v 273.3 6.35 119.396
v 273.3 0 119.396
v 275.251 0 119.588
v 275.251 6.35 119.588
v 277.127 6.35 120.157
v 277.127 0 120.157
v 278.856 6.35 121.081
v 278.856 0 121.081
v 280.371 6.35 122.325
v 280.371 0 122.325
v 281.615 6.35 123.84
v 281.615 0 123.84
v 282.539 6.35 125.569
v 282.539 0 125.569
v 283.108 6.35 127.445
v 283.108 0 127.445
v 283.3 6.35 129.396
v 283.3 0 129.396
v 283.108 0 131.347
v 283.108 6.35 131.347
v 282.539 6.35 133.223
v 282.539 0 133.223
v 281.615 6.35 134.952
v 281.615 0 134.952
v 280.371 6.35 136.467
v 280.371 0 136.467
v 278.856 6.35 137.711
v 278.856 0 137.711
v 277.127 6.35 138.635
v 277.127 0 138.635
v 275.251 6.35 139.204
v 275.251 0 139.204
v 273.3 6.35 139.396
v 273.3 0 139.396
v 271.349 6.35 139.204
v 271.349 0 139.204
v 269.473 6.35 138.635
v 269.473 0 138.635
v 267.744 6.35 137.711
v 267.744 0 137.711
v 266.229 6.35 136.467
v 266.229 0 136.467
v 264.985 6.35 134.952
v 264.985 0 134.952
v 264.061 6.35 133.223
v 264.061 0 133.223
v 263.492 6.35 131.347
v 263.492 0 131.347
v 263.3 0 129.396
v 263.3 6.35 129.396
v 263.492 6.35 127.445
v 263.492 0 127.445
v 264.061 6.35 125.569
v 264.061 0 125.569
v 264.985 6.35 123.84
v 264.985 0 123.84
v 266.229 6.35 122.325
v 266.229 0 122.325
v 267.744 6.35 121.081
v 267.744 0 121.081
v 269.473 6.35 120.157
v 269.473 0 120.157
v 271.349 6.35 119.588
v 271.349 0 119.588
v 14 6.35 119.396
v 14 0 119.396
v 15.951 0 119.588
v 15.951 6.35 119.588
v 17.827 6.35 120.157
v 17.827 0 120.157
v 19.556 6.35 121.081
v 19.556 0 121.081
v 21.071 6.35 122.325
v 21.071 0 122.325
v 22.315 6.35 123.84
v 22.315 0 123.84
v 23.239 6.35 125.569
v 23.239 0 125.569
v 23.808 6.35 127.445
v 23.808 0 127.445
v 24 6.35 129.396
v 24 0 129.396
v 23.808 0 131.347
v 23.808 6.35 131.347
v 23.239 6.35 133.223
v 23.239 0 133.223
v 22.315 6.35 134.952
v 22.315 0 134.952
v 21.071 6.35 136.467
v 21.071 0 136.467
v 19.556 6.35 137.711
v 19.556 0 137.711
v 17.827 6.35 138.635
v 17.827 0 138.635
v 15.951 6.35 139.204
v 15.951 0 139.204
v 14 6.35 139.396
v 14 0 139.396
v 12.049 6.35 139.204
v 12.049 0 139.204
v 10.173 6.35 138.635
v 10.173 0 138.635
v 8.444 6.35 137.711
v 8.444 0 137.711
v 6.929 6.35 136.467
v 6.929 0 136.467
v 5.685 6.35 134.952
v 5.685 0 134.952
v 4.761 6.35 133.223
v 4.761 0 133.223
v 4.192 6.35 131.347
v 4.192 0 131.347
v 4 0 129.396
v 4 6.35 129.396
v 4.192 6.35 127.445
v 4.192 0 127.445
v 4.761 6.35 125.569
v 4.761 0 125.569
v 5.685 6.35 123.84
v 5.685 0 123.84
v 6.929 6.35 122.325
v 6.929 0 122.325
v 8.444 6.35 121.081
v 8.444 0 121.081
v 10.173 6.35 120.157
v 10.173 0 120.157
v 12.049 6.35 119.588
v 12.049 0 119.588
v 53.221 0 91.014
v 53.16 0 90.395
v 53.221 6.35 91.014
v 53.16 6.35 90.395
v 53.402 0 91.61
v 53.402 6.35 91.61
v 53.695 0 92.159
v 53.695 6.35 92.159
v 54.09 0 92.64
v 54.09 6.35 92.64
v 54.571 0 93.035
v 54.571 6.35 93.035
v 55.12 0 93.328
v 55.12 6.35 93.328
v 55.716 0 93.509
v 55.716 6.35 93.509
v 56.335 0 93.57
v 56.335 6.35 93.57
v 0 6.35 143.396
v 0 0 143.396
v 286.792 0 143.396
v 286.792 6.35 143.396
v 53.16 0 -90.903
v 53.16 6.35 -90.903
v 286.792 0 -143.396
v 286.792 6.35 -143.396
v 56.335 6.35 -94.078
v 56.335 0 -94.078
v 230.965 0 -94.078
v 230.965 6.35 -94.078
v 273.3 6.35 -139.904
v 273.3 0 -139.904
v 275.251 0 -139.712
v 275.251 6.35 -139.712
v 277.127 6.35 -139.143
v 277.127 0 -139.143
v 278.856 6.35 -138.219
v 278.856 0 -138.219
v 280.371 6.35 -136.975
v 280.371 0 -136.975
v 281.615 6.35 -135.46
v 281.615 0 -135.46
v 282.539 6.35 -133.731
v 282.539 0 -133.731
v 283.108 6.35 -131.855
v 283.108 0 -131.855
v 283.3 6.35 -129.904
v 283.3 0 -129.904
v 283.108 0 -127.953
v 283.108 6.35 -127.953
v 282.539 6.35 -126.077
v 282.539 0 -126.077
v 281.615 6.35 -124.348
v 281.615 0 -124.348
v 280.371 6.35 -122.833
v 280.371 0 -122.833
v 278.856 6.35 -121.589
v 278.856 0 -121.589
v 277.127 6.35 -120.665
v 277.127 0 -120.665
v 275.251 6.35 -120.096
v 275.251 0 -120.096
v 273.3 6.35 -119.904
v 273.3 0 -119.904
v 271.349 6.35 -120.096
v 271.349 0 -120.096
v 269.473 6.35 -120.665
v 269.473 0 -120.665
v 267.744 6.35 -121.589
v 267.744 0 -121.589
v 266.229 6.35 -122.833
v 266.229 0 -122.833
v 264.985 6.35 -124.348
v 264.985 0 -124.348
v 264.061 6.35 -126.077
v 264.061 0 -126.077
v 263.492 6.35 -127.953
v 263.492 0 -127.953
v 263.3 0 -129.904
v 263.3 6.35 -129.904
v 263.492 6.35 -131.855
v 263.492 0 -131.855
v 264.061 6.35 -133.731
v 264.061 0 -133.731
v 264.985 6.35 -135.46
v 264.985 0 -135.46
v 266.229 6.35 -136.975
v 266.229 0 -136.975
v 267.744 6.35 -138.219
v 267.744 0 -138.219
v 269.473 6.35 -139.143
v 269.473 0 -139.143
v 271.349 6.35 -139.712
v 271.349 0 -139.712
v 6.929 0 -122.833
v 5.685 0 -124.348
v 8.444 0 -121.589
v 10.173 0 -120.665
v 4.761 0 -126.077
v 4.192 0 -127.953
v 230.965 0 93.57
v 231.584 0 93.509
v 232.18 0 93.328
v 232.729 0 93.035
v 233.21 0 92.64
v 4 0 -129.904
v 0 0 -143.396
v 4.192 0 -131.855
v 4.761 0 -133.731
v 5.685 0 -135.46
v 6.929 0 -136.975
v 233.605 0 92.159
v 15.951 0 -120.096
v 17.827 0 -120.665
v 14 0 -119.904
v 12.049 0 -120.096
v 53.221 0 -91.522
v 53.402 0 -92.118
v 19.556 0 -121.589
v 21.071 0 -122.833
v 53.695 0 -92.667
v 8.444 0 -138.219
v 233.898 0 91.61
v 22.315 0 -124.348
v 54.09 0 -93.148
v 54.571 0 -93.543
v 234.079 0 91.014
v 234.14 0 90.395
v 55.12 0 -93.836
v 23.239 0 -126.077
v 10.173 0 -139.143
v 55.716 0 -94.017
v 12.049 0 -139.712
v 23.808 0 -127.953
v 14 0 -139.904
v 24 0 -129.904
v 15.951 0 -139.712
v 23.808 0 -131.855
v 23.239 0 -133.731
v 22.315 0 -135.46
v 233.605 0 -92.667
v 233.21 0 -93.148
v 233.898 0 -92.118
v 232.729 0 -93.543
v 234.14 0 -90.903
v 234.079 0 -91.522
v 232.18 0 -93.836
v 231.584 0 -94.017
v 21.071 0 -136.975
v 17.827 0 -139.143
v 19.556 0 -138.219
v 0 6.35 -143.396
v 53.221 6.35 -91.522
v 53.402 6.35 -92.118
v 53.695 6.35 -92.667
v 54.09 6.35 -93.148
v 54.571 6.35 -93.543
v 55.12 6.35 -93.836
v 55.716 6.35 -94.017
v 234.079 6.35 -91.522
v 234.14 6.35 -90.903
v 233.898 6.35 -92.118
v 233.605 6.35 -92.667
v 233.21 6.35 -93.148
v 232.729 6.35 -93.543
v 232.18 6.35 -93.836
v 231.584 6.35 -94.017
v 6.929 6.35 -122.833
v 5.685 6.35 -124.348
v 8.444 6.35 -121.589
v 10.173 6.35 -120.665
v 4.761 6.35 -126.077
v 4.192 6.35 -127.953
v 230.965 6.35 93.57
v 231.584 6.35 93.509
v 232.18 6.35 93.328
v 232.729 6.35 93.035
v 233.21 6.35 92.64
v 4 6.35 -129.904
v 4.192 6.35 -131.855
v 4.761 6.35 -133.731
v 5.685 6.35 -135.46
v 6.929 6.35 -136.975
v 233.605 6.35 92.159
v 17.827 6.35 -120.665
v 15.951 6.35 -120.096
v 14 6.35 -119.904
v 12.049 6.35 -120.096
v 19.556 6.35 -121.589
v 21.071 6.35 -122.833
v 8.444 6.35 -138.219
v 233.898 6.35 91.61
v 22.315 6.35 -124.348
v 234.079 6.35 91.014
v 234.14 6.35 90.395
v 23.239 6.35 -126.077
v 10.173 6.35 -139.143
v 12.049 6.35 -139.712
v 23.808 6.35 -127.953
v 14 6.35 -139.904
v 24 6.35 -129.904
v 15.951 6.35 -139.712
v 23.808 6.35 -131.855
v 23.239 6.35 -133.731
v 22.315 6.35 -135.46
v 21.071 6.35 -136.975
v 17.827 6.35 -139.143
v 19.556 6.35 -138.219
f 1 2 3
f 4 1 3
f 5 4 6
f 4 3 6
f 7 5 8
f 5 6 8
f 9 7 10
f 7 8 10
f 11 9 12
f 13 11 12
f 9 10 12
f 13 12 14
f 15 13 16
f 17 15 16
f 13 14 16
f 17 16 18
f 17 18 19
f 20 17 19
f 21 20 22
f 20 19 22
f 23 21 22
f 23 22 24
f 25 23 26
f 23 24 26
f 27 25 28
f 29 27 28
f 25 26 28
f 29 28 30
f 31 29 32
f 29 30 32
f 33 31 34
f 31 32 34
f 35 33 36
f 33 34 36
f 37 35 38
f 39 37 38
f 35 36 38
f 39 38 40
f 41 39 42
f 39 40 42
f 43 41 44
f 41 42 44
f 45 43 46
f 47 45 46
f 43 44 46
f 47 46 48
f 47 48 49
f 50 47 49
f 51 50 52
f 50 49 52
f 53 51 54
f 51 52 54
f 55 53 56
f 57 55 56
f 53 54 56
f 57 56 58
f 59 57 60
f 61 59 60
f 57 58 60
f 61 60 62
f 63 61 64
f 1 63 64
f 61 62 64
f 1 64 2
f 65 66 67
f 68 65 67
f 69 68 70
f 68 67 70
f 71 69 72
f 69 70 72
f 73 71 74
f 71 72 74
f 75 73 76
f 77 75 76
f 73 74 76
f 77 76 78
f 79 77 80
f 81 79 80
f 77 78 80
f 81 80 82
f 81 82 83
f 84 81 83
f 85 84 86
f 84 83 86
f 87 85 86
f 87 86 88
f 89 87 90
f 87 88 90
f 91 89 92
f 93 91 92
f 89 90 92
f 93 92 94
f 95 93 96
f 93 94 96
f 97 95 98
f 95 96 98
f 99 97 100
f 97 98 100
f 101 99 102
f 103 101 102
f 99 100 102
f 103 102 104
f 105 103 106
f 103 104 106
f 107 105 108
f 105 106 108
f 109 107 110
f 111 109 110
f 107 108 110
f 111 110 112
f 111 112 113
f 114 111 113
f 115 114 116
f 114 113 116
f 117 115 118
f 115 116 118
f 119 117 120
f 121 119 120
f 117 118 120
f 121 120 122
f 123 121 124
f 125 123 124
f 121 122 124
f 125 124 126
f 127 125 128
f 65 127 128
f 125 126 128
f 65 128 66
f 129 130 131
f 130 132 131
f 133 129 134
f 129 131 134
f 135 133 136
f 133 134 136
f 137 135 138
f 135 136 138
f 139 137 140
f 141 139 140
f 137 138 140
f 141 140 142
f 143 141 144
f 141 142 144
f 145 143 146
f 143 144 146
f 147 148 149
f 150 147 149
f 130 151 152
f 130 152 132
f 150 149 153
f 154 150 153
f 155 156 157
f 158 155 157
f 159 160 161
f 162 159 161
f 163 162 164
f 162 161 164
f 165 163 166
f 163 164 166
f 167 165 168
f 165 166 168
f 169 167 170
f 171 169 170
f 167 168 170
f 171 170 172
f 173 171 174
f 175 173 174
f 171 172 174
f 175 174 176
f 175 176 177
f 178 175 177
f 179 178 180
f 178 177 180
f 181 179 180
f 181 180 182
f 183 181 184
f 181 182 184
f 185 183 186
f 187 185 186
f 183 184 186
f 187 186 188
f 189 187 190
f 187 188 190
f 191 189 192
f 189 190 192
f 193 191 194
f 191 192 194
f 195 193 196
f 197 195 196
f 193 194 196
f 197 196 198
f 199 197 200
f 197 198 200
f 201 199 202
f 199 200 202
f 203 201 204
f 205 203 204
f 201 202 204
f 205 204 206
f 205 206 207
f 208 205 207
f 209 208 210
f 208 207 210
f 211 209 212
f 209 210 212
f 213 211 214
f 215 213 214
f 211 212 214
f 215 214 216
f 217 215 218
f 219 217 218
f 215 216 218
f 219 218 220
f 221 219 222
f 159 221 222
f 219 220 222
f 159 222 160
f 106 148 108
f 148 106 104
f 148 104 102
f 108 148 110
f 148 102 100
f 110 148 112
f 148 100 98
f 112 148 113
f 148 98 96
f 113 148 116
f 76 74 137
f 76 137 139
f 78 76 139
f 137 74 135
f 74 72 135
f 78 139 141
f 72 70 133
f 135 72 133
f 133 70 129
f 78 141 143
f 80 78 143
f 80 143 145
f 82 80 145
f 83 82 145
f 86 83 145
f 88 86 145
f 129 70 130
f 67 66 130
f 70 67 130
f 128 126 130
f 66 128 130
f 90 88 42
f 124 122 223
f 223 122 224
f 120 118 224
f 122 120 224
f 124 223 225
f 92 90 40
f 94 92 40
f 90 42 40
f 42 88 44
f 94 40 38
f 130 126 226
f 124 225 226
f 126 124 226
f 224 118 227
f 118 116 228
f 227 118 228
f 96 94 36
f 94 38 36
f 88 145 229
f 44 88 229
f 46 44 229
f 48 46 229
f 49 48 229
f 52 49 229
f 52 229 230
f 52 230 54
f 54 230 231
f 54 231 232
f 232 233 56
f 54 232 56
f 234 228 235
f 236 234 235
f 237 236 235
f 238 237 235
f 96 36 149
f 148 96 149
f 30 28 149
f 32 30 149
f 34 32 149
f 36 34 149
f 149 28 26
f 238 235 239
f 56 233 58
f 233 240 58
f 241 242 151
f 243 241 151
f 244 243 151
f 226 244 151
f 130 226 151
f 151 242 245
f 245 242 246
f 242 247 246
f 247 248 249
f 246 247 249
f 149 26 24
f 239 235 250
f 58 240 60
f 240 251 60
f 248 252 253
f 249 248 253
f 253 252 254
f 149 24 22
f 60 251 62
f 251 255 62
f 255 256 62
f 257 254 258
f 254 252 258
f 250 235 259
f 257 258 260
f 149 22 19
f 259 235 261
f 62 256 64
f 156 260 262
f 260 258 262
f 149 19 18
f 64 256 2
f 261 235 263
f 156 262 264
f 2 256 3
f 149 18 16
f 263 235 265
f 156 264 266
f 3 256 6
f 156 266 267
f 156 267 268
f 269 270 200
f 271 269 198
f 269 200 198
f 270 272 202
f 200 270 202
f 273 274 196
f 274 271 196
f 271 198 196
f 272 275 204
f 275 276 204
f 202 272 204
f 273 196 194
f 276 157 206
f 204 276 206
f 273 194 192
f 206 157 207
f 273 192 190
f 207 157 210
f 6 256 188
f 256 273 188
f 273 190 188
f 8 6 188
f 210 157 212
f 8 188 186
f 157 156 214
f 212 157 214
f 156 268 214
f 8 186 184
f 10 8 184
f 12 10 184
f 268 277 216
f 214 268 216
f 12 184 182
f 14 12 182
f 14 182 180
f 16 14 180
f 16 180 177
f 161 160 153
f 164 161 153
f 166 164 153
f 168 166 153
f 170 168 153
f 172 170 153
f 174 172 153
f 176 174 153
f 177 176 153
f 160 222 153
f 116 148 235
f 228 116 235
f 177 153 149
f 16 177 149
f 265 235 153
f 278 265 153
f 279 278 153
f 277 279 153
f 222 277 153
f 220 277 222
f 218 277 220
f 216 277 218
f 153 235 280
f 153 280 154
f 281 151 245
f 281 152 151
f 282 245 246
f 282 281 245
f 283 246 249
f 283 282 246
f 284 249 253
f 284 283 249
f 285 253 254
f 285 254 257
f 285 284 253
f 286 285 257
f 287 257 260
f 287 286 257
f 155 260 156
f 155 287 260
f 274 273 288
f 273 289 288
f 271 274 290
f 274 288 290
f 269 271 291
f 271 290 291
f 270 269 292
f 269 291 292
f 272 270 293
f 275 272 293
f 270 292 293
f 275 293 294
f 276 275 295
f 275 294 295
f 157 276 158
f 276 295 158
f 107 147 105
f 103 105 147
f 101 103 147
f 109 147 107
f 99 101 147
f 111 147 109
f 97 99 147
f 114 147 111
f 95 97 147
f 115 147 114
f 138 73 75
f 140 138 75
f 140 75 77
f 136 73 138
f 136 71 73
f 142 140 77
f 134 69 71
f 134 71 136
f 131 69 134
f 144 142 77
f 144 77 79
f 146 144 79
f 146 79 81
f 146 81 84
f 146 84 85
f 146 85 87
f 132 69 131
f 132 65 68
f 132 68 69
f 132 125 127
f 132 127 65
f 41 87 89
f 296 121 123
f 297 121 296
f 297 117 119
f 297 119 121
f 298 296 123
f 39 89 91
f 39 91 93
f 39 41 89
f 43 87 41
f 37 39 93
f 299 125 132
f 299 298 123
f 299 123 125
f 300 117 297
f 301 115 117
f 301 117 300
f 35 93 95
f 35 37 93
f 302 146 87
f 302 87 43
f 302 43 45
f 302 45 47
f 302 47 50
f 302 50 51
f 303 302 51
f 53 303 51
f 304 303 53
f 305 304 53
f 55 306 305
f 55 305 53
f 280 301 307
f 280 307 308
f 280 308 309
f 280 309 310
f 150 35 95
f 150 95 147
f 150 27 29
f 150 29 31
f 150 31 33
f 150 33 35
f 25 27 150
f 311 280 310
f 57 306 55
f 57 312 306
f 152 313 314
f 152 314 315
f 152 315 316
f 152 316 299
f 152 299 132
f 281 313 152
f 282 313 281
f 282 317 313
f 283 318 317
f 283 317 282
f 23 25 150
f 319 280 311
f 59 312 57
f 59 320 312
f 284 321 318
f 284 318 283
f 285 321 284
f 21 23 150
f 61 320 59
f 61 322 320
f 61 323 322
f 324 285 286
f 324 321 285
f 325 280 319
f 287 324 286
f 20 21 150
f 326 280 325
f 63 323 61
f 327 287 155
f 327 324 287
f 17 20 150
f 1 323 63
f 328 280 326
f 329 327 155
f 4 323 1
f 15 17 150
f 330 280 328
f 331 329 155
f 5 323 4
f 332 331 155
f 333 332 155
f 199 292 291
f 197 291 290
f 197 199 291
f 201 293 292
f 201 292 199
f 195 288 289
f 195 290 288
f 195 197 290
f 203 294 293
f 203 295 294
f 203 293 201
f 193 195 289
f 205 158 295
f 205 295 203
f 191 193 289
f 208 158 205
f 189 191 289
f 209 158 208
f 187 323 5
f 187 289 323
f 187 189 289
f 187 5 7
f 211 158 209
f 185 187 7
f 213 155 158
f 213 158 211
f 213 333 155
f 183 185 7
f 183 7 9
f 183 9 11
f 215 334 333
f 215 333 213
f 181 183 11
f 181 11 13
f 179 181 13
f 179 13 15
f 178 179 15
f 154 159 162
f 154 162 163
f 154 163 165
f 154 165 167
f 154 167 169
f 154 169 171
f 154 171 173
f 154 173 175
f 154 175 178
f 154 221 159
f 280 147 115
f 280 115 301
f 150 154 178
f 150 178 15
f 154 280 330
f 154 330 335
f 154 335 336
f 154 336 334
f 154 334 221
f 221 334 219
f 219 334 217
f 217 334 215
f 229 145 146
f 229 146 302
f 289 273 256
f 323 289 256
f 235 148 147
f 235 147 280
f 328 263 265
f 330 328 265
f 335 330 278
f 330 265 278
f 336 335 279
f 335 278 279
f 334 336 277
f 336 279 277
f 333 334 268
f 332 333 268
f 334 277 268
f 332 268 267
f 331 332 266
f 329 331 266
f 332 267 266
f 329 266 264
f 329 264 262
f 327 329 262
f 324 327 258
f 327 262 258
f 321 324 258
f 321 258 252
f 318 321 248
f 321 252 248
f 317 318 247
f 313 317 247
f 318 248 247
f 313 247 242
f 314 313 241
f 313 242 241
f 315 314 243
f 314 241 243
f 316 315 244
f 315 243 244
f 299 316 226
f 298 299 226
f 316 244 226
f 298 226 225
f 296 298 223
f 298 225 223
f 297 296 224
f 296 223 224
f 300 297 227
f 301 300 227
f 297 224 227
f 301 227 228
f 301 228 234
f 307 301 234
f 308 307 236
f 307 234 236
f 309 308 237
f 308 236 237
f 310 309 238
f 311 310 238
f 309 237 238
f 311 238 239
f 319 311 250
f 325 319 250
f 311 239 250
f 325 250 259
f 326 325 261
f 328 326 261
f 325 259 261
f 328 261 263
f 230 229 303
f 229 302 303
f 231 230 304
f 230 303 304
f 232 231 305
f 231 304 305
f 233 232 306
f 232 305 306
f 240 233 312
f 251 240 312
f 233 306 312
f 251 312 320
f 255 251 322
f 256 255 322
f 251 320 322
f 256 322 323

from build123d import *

# Parameters (mm, degrees)
SKETCH1_W           = 286.791999948
SKETCH1_H           = 286.791999948
BOSS_EXTRUDE1_DEPTH = 6.35
SKETCH2_R           = 10
SKETCH2_W           = 180.979932016
SKETCH2_H           = 187.647432016
CUT_EXTRUDE1_DEPTH  = 6.35
FILLET1_R           = 3.175


with BuildPart() as part:
    # Sketch1 → Boss-Extrude1 (new body)
    with BuildSketch(Plane(origin=(0, 0, 0), x_dir=(1, 0, 0), z_dir=(0, 1, 0))):
        with Locations((143.395999974, 0)):
            Rectangle(SKETCH1_W, SKETCH1_H)
    extrude(amount=BOSS_EXTRUDE1_DEPTH)

    # Sketch2 → Cut-Extrude1 (cut)
    with BuildSketch(Plane.XZ):
        with Locations(Location((273.299999948, -129.903999974, 0), (0, 0, 270))):
            Circle(SKETCH2_R)
        with Locations(Location((14, -129.903999974, 0), (0, 0, 270))):
            Circle(SKETCH2_R)
        with Locations(Location((14, 129.395999974, 0), (0, 0, 270))):
            Circle(SKETCH2_R)
        with Locations(Location((273.299999948, 129.395999974, 0), (0, 0, 270))):
            Circle(SKETCH2_R)
        with Locations((143.649999974, -0.254)):
            Rectangle(SKETCH2_W, SKETCH2_H)
    extrude(amount=-CUT_EXTRUDE1_DEPTH, mode=Mode.SUBTRACT)

    # Fillet1
    fillet1_edges = [part.edges().sort_by_distance(p)[0] for p in [
        (53.160033966, 3.175, -94.077716008),
        (53.160033966, 3.175, 93.569716008),
        (234.139965982, 3.175, 93.569716008),
        (234.139965982, 3.175, -94.077716008),
    ]]
    fillet(fillet1_edges, radius=FILLET1_R)


solid = part.part
